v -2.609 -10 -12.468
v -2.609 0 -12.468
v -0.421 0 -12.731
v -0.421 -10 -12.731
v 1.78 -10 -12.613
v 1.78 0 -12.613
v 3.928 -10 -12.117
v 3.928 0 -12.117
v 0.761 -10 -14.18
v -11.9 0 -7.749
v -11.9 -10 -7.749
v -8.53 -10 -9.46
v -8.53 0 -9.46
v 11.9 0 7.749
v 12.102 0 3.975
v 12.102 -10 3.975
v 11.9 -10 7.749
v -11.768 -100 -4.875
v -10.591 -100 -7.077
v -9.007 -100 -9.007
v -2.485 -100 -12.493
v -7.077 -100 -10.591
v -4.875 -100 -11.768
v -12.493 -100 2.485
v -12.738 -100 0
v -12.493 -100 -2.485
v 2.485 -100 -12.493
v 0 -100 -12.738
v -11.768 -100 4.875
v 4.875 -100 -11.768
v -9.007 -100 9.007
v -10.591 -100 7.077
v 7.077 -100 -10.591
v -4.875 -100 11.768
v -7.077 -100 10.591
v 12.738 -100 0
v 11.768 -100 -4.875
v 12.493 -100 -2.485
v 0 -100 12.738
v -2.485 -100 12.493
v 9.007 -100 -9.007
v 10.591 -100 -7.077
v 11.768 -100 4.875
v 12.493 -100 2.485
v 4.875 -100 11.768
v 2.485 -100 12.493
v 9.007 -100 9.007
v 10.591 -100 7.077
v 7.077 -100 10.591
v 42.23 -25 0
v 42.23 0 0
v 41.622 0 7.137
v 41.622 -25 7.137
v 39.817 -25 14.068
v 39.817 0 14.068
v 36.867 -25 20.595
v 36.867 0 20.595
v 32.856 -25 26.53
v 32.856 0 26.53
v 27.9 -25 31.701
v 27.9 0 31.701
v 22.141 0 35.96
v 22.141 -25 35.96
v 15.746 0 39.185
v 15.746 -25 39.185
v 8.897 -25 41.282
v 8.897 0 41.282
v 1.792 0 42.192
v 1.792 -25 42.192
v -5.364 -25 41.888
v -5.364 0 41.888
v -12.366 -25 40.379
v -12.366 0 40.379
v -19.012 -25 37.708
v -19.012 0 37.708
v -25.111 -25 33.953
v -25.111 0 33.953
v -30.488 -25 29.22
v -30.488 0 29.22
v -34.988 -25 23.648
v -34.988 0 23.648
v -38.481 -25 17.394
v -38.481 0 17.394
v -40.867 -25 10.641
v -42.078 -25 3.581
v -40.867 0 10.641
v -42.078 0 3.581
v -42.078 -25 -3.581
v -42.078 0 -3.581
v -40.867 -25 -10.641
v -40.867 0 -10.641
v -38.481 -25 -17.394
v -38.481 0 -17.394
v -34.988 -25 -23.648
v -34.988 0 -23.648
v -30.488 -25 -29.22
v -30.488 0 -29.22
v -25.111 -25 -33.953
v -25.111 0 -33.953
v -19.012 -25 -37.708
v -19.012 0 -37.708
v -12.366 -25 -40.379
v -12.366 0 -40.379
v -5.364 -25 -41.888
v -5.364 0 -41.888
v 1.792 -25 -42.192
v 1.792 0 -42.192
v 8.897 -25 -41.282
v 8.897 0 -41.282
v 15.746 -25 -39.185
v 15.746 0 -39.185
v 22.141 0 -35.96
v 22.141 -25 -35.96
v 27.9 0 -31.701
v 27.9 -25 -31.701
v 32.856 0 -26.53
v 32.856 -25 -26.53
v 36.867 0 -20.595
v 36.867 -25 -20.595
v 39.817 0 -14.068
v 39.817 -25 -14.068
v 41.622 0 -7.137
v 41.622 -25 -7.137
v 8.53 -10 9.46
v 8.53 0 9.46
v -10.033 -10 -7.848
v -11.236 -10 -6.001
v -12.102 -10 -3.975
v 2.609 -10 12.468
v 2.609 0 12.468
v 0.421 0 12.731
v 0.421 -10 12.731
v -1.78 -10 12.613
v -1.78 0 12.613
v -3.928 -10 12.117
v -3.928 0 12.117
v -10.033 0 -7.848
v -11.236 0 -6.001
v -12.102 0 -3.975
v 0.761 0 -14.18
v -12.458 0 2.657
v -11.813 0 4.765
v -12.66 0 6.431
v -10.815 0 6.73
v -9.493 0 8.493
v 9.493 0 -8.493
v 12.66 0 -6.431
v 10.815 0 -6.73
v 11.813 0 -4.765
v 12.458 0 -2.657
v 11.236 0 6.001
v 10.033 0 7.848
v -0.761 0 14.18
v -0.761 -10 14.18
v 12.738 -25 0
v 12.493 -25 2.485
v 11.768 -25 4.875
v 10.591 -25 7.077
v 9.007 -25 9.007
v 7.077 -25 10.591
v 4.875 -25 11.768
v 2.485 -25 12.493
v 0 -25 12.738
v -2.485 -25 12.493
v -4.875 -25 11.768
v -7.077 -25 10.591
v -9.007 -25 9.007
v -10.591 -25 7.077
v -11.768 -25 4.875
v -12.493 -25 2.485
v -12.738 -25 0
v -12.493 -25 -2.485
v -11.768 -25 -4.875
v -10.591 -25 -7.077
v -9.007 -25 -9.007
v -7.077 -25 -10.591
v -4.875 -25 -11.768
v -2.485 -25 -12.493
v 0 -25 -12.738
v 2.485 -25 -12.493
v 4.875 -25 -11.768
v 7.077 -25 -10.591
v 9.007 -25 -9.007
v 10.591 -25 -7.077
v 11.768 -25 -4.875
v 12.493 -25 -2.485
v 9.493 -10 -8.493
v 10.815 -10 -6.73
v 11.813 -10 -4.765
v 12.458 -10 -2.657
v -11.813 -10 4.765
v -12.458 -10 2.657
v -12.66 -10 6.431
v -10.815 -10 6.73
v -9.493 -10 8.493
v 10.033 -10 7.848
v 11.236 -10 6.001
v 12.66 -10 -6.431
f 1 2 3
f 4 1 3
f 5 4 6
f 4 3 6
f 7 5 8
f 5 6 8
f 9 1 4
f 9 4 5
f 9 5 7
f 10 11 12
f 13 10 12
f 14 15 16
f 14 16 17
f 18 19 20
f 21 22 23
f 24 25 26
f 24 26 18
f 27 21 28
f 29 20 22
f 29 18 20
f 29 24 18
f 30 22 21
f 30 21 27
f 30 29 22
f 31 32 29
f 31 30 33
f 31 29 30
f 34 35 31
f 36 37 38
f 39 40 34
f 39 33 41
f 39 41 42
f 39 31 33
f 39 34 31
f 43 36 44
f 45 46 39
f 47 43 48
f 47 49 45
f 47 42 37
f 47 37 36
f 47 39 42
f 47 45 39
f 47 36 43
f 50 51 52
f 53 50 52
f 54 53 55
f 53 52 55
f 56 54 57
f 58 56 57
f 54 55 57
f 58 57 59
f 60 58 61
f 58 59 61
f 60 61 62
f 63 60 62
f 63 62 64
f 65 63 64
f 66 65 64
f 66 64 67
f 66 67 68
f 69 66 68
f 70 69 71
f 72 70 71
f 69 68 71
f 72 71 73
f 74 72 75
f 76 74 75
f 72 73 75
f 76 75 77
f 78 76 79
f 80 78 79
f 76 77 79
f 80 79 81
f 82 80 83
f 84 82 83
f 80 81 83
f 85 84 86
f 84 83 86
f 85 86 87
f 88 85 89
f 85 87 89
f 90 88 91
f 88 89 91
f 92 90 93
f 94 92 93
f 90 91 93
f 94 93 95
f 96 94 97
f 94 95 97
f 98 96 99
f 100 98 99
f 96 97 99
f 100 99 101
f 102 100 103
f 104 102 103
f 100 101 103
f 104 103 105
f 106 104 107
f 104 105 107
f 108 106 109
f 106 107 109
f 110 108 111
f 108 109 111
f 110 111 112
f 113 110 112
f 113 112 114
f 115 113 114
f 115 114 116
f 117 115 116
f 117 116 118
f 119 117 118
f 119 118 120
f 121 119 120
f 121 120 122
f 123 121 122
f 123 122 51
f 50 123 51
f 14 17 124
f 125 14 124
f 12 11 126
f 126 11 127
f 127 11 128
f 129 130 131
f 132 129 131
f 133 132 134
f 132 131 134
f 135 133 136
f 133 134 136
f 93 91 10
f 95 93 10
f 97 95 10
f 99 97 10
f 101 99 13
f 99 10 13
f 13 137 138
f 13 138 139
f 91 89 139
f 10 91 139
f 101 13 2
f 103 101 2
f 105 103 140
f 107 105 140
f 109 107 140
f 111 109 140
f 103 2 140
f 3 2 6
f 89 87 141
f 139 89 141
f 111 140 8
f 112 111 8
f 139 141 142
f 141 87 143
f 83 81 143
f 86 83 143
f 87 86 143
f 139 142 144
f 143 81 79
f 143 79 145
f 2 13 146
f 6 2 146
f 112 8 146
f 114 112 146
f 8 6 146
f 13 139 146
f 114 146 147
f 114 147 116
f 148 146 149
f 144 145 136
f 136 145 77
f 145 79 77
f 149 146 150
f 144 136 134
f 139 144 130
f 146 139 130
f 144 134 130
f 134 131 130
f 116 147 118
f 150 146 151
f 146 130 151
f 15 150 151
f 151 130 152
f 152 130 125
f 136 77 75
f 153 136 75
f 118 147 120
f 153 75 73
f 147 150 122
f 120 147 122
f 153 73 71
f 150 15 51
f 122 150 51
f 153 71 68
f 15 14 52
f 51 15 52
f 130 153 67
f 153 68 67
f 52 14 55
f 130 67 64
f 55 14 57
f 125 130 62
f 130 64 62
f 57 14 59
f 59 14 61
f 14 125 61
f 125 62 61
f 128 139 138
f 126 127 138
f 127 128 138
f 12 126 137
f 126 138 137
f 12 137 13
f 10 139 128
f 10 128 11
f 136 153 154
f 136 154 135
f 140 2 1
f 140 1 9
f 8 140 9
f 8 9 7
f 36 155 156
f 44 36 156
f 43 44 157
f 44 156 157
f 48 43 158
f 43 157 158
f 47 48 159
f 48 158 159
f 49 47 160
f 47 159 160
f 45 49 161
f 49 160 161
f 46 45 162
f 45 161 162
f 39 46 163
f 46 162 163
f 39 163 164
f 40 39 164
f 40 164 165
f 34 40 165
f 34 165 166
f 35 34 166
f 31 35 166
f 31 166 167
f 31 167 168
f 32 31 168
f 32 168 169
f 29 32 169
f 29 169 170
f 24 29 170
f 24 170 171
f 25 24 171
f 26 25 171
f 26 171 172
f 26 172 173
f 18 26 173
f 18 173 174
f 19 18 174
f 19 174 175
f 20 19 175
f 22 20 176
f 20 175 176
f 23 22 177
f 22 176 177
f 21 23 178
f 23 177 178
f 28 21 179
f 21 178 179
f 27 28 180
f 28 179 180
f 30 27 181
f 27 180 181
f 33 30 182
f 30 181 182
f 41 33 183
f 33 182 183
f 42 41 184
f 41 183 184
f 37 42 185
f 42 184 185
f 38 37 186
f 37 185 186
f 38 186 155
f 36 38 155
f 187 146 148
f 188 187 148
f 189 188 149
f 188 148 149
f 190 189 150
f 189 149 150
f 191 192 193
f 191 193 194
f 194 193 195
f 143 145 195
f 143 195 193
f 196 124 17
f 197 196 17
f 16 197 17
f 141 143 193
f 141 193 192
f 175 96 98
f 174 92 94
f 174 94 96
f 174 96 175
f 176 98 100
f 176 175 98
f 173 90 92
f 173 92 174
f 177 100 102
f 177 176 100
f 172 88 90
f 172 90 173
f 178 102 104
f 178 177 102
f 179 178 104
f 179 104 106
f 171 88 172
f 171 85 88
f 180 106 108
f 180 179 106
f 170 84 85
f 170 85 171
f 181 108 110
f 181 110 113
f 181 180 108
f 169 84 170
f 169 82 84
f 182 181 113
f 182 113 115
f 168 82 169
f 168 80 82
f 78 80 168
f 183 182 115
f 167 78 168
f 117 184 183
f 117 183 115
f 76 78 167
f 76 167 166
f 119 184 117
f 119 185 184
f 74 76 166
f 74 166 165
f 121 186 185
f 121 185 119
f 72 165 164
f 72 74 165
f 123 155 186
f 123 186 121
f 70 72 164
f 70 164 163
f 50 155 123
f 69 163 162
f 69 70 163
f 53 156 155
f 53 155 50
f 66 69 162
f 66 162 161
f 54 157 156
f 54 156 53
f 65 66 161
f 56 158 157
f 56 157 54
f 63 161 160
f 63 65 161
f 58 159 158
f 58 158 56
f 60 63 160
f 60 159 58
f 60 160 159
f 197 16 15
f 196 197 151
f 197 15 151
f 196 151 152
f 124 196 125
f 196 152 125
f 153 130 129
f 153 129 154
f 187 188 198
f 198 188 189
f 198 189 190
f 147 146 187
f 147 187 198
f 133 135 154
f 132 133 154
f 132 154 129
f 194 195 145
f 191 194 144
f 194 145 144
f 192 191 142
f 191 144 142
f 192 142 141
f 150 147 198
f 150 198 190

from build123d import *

# Parameters (mm, degrees)
F0_R     = 42.229766
F1_DEPTH = 25
F3_DEPTH = 10
F4_R     = 12.738084
F5_DEPTH = 100


with BuildPart() as f1:
    # F0 (on Front) → F1 (new body)
    with BuildSketch(Plane.XZ):
        Circle(F0_R)
    extrude(amount=F1_DEPTH)

    # F2 (on Front) → F3 (cut)
    with BuildSketch(Plane.XZ):
        Polygon((0.760662, -14.179654), (12.660271, -6.431074), (11.899609, 7.74858), (-0.760662, 14.179654), (-12.660271, 6.431074), (-11.899609, -7.74858), align=None)
    extrude(amount=F3_DEPTH, mode=Mode.SUBTRACT)

    # F4 (on Front) → F5 (join)
    with BuildSketch(Plane.XZ):
        Circle(F4_R)
    extrude(amount=F5_DEPTH)


solid = f1.part
